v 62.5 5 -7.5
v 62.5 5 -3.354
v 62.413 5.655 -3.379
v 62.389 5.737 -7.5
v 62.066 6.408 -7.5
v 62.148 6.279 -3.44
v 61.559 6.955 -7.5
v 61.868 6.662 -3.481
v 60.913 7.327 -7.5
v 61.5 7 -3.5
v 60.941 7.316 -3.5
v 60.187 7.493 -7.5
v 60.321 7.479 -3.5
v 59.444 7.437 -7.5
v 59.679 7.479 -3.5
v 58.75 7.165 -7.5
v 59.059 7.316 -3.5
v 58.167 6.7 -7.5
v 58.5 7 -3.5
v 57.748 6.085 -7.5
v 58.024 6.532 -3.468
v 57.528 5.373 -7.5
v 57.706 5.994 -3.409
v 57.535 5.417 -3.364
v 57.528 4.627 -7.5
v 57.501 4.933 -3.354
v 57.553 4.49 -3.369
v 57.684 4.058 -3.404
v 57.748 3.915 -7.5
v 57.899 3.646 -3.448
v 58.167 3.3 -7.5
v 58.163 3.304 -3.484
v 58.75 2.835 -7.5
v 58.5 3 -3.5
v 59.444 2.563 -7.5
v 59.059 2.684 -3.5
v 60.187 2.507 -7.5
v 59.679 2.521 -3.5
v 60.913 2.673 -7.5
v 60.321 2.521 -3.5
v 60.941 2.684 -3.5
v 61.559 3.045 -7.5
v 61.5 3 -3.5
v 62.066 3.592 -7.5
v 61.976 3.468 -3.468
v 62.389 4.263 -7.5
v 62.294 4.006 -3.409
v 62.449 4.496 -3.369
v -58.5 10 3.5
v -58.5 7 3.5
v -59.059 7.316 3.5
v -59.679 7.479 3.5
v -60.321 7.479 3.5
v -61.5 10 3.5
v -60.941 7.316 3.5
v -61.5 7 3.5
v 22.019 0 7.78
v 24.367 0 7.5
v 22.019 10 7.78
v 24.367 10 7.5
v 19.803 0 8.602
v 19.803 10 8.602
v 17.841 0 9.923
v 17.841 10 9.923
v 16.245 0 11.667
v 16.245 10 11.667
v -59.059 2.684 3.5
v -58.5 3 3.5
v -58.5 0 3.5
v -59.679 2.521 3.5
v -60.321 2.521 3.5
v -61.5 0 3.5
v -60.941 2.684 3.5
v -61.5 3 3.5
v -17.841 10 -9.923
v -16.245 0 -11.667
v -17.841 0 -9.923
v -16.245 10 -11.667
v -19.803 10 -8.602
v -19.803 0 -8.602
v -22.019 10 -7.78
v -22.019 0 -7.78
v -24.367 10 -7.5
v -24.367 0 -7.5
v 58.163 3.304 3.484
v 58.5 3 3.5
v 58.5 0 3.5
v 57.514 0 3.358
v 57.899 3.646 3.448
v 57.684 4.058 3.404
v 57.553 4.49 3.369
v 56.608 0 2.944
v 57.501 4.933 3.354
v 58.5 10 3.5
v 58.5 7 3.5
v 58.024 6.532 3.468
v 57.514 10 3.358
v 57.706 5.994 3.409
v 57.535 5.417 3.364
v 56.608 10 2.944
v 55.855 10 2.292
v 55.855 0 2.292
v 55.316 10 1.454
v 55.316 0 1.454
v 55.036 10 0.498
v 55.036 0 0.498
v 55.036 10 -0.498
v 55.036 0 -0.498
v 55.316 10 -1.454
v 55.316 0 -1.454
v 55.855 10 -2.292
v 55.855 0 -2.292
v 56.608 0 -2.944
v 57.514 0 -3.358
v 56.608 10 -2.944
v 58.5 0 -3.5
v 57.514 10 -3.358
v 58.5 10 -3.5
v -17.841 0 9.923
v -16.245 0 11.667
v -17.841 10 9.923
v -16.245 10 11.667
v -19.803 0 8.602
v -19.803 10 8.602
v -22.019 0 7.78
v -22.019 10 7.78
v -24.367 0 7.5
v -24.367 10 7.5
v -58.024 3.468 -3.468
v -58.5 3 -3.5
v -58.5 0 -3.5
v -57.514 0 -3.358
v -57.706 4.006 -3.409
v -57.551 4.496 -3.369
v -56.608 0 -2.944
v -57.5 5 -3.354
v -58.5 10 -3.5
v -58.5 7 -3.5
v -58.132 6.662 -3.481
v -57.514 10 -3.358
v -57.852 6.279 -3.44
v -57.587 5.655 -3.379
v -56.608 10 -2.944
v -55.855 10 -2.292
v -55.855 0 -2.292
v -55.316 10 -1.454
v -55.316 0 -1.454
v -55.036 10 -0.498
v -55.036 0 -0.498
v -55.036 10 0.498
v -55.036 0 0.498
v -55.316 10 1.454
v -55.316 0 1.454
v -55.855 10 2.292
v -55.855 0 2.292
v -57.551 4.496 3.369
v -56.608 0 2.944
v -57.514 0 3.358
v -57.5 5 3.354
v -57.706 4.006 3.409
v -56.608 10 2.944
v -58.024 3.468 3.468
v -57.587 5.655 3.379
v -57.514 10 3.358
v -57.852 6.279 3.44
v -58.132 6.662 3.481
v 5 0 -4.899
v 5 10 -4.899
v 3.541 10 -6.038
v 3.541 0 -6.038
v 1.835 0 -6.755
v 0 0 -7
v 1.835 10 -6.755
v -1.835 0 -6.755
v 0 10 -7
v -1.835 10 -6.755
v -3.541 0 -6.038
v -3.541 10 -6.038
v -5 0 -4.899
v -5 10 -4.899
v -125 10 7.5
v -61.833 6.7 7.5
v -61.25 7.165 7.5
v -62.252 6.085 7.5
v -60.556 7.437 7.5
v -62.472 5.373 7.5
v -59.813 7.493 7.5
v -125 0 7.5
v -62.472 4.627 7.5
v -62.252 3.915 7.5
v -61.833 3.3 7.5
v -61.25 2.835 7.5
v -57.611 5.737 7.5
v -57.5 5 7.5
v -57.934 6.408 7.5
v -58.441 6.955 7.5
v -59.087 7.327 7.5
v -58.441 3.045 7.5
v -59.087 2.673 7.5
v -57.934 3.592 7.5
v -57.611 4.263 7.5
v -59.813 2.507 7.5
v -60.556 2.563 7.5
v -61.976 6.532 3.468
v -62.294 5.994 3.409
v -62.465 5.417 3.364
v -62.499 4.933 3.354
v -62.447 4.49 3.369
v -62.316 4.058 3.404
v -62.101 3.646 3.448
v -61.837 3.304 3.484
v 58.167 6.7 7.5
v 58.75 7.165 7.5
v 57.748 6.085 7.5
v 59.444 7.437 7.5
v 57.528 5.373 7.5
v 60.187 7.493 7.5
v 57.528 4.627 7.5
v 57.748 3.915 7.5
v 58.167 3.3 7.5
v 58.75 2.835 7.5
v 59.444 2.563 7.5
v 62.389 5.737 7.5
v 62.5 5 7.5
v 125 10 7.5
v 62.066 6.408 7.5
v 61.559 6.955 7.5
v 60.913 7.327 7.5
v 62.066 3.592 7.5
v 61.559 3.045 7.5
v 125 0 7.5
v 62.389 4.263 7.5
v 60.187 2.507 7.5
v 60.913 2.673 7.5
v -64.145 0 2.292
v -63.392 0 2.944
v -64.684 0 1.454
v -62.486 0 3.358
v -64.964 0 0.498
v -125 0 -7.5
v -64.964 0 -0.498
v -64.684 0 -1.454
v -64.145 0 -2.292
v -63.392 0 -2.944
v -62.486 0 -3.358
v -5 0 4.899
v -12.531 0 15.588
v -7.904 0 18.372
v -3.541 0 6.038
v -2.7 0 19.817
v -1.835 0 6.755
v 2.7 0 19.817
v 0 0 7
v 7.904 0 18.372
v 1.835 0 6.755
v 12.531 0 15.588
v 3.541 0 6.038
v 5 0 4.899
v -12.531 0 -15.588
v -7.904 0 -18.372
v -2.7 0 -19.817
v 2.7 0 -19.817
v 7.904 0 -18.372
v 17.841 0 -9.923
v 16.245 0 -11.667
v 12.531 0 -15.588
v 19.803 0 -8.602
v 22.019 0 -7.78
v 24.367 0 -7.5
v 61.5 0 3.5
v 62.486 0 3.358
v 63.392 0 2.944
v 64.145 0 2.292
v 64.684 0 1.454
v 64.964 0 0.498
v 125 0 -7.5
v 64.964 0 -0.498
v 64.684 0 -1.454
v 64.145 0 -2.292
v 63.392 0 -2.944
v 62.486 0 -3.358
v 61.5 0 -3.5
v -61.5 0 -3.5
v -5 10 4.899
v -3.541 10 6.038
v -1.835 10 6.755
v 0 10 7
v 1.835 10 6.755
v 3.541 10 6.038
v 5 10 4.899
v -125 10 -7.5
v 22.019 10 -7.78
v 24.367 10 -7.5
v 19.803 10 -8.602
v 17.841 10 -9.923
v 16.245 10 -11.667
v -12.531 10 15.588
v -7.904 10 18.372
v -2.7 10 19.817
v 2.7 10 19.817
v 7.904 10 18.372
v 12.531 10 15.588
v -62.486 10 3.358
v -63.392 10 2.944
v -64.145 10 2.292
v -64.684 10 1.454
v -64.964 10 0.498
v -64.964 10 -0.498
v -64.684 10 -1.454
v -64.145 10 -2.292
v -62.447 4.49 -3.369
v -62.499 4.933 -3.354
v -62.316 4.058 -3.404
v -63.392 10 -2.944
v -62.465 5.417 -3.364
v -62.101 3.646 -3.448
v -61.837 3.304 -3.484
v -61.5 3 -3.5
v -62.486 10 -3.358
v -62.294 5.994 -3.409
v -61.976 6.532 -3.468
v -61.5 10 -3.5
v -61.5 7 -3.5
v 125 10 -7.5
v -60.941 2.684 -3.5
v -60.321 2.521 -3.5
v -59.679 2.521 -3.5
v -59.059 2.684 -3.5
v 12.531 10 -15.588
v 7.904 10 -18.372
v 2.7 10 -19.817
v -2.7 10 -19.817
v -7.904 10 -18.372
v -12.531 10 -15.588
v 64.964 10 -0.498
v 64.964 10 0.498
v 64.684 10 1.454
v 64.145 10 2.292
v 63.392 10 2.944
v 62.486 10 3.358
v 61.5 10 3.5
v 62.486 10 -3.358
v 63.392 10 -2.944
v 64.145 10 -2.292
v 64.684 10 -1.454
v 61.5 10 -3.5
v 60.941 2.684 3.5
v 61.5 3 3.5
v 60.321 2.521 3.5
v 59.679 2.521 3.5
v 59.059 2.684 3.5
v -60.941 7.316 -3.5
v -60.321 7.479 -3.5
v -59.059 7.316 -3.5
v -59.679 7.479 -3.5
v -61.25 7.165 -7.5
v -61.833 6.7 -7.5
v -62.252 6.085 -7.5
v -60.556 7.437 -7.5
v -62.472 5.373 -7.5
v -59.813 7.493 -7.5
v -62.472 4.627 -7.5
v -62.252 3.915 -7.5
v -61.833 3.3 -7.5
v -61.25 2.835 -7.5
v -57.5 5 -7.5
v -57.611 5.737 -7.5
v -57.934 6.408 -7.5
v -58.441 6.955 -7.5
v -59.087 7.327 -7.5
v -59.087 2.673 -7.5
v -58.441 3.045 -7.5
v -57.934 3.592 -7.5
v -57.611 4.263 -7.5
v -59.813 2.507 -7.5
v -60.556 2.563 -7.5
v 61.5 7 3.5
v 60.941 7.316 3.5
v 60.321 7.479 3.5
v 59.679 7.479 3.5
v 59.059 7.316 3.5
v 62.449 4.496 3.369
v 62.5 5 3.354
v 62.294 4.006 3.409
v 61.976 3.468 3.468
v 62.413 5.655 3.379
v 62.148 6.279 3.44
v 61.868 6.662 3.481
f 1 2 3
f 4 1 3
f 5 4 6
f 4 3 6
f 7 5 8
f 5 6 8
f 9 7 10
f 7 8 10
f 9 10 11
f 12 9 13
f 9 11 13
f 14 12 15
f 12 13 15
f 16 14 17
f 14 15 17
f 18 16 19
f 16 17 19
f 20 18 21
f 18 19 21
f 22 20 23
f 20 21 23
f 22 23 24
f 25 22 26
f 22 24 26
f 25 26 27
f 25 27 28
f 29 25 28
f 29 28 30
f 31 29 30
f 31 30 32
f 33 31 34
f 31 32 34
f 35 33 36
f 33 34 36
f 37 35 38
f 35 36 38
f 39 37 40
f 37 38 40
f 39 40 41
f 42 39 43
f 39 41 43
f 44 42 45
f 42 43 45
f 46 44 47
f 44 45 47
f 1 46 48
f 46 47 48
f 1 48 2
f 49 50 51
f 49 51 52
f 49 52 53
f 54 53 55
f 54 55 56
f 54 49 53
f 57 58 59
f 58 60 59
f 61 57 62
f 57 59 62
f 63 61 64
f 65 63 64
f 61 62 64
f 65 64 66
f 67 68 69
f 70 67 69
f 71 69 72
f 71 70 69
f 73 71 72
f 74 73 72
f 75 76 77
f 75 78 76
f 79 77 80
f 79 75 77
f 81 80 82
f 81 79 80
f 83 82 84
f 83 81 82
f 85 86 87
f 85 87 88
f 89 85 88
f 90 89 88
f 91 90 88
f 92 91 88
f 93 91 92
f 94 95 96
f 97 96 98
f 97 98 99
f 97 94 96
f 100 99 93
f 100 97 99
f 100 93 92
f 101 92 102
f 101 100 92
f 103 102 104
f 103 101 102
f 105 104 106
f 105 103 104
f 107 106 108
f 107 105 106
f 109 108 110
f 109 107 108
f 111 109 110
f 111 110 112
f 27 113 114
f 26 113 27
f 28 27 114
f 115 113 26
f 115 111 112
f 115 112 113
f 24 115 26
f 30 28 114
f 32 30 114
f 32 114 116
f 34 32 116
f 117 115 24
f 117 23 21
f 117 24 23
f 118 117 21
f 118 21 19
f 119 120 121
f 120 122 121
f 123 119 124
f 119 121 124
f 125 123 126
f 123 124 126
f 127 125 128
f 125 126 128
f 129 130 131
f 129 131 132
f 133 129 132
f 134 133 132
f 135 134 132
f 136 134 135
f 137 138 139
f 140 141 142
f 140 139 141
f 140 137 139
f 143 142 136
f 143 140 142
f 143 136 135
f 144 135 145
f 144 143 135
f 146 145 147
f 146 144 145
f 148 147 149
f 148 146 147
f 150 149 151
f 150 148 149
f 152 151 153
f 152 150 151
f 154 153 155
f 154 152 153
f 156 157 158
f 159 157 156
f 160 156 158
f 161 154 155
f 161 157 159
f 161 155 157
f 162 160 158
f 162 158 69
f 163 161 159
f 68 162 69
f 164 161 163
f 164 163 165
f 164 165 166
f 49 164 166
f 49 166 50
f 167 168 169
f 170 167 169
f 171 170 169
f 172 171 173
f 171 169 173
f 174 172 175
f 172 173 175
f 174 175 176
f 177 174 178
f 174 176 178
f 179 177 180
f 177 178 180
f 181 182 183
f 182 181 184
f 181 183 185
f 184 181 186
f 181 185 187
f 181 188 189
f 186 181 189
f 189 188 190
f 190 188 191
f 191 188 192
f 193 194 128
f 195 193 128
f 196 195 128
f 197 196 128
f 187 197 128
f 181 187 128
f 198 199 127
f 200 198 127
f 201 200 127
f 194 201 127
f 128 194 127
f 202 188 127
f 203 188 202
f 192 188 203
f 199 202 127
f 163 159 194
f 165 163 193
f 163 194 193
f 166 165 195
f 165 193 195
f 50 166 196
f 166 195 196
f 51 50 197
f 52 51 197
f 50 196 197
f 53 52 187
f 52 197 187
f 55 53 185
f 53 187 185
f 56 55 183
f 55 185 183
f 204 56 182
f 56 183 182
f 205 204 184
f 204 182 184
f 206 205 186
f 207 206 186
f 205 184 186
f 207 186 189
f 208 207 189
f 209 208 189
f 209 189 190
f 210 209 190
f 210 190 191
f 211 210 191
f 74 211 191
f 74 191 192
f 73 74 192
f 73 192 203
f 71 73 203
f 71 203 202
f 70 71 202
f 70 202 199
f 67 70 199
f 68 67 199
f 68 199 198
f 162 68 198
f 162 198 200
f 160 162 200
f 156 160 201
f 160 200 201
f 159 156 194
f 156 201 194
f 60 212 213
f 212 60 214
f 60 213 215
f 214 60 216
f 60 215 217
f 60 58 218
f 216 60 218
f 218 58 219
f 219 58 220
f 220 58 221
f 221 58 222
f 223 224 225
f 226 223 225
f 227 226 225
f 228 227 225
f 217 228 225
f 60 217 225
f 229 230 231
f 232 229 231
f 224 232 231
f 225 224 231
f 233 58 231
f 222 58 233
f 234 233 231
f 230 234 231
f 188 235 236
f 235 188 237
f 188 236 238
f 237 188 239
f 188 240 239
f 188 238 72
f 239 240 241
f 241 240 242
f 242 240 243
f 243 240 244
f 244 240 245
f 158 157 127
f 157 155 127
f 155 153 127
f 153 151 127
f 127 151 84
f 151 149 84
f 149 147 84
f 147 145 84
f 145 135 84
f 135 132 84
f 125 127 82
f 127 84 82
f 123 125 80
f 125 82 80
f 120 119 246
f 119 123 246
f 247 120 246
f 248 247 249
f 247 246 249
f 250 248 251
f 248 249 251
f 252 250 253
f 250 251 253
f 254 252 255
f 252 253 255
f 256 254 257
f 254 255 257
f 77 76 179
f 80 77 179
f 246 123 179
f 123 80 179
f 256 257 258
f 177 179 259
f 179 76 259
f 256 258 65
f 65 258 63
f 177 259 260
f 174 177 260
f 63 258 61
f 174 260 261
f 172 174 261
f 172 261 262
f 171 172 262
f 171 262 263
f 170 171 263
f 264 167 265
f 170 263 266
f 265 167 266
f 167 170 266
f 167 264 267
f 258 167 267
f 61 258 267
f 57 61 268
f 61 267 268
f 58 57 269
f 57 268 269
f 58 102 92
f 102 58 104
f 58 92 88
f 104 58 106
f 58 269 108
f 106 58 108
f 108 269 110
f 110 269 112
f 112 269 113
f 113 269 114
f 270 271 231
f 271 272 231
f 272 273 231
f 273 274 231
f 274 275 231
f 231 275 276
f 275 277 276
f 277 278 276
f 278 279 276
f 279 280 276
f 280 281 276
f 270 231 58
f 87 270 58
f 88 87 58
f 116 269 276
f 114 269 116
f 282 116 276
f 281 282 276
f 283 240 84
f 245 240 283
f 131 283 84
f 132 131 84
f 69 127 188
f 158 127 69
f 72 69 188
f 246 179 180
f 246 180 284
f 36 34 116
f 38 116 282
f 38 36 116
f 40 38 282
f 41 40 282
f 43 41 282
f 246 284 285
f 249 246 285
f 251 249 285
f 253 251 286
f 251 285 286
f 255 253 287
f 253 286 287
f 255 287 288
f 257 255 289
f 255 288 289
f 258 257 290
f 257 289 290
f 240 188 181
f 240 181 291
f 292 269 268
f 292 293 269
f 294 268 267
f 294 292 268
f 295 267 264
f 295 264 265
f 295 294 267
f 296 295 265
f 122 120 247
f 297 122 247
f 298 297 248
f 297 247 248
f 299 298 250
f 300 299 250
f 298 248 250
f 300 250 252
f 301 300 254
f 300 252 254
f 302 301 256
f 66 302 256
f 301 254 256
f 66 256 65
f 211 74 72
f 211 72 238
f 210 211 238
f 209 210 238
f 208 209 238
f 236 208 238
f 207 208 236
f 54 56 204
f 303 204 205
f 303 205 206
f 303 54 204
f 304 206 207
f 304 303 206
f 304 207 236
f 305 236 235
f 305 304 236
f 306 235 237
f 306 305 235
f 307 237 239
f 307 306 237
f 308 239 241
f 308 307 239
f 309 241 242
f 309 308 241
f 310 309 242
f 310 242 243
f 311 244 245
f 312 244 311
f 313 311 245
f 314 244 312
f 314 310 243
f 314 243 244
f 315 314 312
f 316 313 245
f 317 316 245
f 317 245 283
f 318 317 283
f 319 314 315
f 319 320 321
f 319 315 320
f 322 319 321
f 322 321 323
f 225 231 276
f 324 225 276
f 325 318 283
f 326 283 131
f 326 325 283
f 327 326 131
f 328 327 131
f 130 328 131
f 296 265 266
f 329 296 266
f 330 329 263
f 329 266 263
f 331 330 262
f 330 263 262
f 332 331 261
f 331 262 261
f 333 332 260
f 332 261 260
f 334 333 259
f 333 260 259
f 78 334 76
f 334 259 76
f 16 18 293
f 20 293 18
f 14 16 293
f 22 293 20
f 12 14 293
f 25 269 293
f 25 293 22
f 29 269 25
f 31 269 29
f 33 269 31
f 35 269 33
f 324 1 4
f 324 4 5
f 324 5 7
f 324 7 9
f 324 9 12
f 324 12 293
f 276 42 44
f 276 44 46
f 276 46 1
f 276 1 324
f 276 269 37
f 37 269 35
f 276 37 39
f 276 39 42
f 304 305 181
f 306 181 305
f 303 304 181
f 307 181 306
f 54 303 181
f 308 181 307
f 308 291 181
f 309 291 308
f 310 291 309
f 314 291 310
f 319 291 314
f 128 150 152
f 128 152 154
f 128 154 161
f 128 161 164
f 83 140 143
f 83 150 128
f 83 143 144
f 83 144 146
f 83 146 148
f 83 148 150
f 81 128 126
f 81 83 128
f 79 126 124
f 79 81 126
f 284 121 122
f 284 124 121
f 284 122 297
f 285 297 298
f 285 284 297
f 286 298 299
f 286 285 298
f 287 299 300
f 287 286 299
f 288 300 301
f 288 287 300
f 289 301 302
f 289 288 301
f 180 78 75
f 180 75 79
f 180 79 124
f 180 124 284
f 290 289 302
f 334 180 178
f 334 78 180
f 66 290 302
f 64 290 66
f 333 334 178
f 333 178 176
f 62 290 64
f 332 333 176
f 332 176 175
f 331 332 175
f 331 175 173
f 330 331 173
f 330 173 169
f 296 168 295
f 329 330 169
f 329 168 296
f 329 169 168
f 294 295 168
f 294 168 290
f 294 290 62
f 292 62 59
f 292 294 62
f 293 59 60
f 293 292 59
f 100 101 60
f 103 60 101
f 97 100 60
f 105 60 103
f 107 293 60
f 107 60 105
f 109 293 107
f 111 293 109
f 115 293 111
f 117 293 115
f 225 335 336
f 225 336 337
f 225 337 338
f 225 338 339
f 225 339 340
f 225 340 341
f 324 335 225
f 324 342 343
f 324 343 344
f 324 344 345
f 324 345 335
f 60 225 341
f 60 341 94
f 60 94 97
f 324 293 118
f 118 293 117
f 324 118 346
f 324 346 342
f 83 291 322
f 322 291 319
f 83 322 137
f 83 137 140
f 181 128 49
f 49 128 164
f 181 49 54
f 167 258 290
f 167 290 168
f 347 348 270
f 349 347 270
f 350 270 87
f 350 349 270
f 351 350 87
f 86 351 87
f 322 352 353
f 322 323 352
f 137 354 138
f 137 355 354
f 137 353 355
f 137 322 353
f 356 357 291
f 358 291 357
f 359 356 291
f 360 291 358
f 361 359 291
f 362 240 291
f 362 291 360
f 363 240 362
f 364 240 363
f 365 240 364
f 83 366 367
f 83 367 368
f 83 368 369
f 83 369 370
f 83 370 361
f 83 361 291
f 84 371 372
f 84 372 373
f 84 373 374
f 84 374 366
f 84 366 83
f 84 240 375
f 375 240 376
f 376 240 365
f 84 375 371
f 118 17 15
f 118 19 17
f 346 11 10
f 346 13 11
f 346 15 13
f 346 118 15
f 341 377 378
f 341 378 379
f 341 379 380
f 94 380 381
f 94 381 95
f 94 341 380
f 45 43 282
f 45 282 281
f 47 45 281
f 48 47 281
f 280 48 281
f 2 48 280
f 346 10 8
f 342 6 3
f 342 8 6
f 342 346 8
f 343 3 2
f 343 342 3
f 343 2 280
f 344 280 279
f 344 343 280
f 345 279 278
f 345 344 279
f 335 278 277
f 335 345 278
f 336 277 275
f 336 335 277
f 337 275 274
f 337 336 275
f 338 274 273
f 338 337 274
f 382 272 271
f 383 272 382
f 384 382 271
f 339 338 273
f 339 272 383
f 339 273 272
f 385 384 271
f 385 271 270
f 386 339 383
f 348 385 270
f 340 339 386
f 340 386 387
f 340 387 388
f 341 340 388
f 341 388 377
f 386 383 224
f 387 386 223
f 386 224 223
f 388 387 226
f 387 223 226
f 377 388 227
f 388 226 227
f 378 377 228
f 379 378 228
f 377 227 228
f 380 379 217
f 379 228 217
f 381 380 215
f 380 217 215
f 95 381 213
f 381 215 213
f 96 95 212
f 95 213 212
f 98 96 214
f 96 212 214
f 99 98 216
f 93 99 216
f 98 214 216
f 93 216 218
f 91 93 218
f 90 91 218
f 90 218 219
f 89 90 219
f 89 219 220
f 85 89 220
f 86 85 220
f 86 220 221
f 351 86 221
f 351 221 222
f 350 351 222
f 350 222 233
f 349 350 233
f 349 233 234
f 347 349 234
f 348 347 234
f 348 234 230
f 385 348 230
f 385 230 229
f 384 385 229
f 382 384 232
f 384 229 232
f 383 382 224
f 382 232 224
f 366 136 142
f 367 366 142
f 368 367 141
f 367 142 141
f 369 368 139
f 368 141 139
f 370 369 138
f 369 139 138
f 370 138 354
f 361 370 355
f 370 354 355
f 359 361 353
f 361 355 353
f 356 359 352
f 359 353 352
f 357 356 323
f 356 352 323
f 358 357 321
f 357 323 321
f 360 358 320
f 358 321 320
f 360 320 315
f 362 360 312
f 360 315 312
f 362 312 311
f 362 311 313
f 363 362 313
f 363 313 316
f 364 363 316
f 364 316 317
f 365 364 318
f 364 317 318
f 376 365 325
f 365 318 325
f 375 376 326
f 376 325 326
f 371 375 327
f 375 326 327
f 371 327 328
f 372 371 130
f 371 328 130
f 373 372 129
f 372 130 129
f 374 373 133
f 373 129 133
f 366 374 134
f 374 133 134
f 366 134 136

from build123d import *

# Parameters (mm, degrees)
SKETCH1_R           = 20
SKETCH1_W           = 250
SKETCH1_H           = 15
BOSS_EXTRUDE1_DEPTH = 10
CUT_EXTRUDE1_DEPTH  = 127.984250992
FILLET1_R           = 10
CUT_EXTRUDE2_DEPTH  = 127.984250992
SKETCH6_R           = 2.5
CUT_EXTRUDE3_DEPTH  = 129.379320765
SKETCH7_R           = 2.5
CUT_EXTRUDE4_DEPTH  = 129.379320772


with BuildPart() as part:
    # Sketch1 → Boss-Extrude1 (new body)
    with BuildSketch(Plane(origin=(0, 0, 0), x_dir=(1, 0, 0), z_dir=(0, 1, 0))):
        Circle(SKETCH1_R)
        Rectangle(SKETCH1_W, SKETCH1_H)
    extrude(amount=BOSS_EXTRUDE1_DEPTH)

    # Sketch2 → Cut-Extrude1 (cut, through all)
    with BuildSketch(Plane(origin=(0, 10, 0), x_dir=(1, 0, 0), z_dir=(0, 1, 0))):
        with BuildLine():
            Line((-5, 4.898979486), (-5, -4.898979486))
            ThreePointArc((-5, -4.898979486), (0, -7), (5, -4.898979486))
            Line((5, -4.898979486), (5, 4.898979486))
            ThreePointArc((5, 4.898979486), (0, 7), (-5, 4.898979486))
        make_face()
    extrude(amount=-CUT_EXTRUDE1_DEPTH, mode=Mode.SUBTRACT)

    # Fillet1
    fillet1_edges = [part.edges().sort_by_distance(p)[0] for p in [
        (-18.540496218, 5, -7.5),
        (18.540496218, 5, -7.5),
        (-18.540496218, 5, 7.5),
        (18.540496218, 5, 7.5),
    ]]
    fillet(fillet1_edges, radius=FILLET1_R)

    # Sketch4 → Cut-Extrude2 (cut, through all)
    with BuildSketch(Plane(origin=(0, 10, 0), x_dir=(1, 0, 0), z_dir=(0, 1, 0))):
        with BuildLine():
            Line((-61.5, 3.5), (-58.5, 3.5))
            ThreePointArc((-58.5, 3.5), (-55, 0), (-58.5, -3.5))
            Line((-58.5, -3.5), (-61.5, -3.5))
            ThreePointArc((-61.5, -3.5), (-65, 0), (-61.5, 3.5))
        make_face()
        with BuildLine():
            Line((58.5, 3.5), (61.5, 3.5))
            ThreePointArc((61.5, 3.5), (65, 0), (61.5, -3.5))
            Line((61.5, -3.5), (58.5, -3.5))
            ThreePointArc((58.5, -3.5), (55, 0), (58.5, 3.5))
        make_face()
    extrude(amount=-CUT_EXTRUDE2_DEPTH, mode=Mode.SUBTRACT)

    # Sketch6 → Cut-Extrude3 (cut, through all)
    with BuildSketch(Plane.XY.offset(7.5)):
        with Locations((-60, 5)):
            Circle(SKETCH6_R)
    extrude(amount=-CUT_EXTRUDE3_DEPTH, mode=Mode.SUBTRACT)

    # Sketch7 → Cut-Extrude4 (cut, through all)
    with BuildSketch(Plane.XY.offset(7.5)):
        with Locations((60, 5)):
            Circle(SKETCH7_R)
    extrude(amount=-CUT_EXTRUDE4_DEPTH, mode=Mode.SUBTRACT)


solid = part.part
